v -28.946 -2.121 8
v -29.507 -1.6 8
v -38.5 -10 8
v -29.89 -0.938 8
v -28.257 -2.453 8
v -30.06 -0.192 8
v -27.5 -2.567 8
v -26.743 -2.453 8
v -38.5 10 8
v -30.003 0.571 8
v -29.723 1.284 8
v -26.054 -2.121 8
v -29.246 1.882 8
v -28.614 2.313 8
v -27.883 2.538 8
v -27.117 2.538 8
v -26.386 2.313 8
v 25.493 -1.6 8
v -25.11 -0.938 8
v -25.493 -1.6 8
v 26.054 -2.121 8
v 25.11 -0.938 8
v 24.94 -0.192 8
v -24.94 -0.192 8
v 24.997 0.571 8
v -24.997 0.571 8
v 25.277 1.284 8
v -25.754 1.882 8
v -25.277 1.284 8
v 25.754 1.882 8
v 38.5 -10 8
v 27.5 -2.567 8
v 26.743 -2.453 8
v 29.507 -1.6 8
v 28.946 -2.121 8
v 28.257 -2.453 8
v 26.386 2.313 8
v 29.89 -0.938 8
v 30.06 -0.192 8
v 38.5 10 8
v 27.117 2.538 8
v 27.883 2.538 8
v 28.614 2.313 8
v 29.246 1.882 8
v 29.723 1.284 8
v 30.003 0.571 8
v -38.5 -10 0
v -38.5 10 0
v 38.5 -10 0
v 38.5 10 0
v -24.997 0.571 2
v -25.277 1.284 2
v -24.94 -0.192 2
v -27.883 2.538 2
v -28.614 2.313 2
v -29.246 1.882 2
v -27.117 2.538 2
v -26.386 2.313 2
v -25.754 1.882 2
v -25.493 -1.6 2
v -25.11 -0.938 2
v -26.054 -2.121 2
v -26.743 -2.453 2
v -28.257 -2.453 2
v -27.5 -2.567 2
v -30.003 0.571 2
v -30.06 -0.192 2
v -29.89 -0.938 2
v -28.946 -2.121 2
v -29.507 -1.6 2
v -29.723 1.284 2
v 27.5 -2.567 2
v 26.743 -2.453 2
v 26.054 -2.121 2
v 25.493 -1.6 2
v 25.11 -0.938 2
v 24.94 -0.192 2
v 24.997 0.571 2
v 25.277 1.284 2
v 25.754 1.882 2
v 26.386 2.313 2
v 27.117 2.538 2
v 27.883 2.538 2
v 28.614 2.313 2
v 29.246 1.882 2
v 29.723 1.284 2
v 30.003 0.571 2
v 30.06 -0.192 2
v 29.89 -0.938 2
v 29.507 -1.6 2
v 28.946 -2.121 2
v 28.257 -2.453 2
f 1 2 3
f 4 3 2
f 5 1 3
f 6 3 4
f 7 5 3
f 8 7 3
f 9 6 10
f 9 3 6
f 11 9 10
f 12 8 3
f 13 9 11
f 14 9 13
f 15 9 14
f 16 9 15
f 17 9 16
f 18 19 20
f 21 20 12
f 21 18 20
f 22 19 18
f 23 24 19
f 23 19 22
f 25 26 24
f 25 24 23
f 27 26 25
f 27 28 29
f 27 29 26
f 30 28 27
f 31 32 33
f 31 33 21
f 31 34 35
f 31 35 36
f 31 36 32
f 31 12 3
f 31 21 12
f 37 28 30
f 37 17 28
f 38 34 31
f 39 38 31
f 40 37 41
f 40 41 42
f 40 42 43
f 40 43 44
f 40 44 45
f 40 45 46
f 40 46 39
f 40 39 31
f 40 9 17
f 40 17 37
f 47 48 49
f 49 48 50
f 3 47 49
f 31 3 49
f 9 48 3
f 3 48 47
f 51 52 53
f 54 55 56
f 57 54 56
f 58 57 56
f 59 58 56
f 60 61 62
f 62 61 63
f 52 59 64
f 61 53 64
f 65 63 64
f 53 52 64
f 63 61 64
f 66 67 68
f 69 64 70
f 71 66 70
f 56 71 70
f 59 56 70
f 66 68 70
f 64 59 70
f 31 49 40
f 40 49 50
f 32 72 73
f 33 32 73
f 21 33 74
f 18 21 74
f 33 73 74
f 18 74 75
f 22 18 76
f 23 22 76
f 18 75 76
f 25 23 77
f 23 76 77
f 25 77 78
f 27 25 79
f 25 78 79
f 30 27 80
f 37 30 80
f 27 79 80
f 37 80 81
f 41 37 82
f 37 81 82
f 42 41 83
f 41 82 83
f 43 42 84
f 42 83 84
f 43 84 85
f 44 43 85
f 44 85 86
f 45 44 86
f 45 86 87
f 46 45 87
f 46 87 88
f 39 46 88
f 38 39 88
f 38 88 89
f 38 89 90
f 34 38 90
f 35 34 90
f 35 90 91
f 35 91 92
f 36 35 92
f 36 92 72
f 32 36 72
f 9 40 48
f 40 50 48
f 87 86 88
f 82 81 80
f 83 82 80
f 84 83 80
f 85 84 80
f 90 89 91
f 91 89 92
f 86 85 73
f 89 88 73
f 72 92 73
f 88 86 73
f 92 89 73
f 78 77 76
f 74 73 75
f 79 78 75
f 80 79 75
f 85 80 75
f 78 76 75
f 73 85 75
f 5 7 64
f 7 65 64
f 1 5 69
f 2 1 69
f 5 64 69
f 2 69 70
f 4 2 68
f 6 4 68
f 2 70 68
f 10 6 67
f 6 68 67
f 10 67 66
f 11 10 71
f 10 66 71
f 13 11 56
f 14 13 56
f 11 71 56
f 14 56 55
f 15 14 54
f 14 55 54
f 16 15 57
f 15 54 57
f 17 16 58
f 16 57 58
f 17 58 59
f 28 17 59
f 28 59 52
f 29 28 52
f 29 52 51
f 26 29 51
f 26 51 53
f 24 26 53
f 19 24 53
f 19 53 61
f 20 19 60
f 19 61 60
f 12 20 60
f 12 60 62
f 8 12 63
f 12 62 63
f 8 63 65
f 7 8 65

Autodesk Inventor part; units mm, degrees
ref_plane "YZ Plane" through (0, 0, 0) normal (1, 0, 0) x (0, 1, 0)
ref_plane "XZ Plane" through (0, 0, 0) normal (0, 1, 0) x (-1, 0, 0)
ref_plane "XY Plane" through (0, 0, 0) normal (0, 0, 1) x (1, 0, 0)
sketch "Sketch1" plane through (0, 0, 0) normal (0, 0, 1) x (1, 0, 0)
  line L0 (-38.5, -10) -> (38.5, -10)
  line L1 (38.5, -10) -> (38.5, 10)
  line L2 (38.5, 10) -> (-38.5, 10)
  line L3 (-38.5, 10) -> (-38.5, -10)
  line L4 (-38.5, -10) -> (38.5, 10) construction
  line L5 (38.5, -10) -> (-38.5, 10) construction
  point P0 (0, 0)
  dimension "d0" = 77
  dimension "d1" = 20
extrude "Extrusion1" add sketch "Sketch1" along normal blind 8
sketch "Sketch2" plane through (0, 0, 8) normal (0, 0, 1) x (1, 0, 0)
  line L0 (-38.5, -10) -> (38.5, -10) projected
  line L1 (38.5, -10) -> (38.5, 10) projected
  line L2 (-38.5, 10) -> (-38.5, -10) projected
  point P0 (0, 0)
  point P1 (-27.5, 0)
  point P2 (27.5, 0)
  point P3 (-38.5, 0)
  dimension "d4" = 10
  dimension "d5" = 10
  dimension "d6" = 11
  dimension "d14" = 11
hole "Hole1" at (-27.5, 0, 8) at (27.5, 0, 8) direction (0, 0, -1) diameter 5.134 depth 6 thread size "M6x0.8" class "6H" standard "ISO Metric profile"
properties part number "Spann backe" material "Steel, Mild"
